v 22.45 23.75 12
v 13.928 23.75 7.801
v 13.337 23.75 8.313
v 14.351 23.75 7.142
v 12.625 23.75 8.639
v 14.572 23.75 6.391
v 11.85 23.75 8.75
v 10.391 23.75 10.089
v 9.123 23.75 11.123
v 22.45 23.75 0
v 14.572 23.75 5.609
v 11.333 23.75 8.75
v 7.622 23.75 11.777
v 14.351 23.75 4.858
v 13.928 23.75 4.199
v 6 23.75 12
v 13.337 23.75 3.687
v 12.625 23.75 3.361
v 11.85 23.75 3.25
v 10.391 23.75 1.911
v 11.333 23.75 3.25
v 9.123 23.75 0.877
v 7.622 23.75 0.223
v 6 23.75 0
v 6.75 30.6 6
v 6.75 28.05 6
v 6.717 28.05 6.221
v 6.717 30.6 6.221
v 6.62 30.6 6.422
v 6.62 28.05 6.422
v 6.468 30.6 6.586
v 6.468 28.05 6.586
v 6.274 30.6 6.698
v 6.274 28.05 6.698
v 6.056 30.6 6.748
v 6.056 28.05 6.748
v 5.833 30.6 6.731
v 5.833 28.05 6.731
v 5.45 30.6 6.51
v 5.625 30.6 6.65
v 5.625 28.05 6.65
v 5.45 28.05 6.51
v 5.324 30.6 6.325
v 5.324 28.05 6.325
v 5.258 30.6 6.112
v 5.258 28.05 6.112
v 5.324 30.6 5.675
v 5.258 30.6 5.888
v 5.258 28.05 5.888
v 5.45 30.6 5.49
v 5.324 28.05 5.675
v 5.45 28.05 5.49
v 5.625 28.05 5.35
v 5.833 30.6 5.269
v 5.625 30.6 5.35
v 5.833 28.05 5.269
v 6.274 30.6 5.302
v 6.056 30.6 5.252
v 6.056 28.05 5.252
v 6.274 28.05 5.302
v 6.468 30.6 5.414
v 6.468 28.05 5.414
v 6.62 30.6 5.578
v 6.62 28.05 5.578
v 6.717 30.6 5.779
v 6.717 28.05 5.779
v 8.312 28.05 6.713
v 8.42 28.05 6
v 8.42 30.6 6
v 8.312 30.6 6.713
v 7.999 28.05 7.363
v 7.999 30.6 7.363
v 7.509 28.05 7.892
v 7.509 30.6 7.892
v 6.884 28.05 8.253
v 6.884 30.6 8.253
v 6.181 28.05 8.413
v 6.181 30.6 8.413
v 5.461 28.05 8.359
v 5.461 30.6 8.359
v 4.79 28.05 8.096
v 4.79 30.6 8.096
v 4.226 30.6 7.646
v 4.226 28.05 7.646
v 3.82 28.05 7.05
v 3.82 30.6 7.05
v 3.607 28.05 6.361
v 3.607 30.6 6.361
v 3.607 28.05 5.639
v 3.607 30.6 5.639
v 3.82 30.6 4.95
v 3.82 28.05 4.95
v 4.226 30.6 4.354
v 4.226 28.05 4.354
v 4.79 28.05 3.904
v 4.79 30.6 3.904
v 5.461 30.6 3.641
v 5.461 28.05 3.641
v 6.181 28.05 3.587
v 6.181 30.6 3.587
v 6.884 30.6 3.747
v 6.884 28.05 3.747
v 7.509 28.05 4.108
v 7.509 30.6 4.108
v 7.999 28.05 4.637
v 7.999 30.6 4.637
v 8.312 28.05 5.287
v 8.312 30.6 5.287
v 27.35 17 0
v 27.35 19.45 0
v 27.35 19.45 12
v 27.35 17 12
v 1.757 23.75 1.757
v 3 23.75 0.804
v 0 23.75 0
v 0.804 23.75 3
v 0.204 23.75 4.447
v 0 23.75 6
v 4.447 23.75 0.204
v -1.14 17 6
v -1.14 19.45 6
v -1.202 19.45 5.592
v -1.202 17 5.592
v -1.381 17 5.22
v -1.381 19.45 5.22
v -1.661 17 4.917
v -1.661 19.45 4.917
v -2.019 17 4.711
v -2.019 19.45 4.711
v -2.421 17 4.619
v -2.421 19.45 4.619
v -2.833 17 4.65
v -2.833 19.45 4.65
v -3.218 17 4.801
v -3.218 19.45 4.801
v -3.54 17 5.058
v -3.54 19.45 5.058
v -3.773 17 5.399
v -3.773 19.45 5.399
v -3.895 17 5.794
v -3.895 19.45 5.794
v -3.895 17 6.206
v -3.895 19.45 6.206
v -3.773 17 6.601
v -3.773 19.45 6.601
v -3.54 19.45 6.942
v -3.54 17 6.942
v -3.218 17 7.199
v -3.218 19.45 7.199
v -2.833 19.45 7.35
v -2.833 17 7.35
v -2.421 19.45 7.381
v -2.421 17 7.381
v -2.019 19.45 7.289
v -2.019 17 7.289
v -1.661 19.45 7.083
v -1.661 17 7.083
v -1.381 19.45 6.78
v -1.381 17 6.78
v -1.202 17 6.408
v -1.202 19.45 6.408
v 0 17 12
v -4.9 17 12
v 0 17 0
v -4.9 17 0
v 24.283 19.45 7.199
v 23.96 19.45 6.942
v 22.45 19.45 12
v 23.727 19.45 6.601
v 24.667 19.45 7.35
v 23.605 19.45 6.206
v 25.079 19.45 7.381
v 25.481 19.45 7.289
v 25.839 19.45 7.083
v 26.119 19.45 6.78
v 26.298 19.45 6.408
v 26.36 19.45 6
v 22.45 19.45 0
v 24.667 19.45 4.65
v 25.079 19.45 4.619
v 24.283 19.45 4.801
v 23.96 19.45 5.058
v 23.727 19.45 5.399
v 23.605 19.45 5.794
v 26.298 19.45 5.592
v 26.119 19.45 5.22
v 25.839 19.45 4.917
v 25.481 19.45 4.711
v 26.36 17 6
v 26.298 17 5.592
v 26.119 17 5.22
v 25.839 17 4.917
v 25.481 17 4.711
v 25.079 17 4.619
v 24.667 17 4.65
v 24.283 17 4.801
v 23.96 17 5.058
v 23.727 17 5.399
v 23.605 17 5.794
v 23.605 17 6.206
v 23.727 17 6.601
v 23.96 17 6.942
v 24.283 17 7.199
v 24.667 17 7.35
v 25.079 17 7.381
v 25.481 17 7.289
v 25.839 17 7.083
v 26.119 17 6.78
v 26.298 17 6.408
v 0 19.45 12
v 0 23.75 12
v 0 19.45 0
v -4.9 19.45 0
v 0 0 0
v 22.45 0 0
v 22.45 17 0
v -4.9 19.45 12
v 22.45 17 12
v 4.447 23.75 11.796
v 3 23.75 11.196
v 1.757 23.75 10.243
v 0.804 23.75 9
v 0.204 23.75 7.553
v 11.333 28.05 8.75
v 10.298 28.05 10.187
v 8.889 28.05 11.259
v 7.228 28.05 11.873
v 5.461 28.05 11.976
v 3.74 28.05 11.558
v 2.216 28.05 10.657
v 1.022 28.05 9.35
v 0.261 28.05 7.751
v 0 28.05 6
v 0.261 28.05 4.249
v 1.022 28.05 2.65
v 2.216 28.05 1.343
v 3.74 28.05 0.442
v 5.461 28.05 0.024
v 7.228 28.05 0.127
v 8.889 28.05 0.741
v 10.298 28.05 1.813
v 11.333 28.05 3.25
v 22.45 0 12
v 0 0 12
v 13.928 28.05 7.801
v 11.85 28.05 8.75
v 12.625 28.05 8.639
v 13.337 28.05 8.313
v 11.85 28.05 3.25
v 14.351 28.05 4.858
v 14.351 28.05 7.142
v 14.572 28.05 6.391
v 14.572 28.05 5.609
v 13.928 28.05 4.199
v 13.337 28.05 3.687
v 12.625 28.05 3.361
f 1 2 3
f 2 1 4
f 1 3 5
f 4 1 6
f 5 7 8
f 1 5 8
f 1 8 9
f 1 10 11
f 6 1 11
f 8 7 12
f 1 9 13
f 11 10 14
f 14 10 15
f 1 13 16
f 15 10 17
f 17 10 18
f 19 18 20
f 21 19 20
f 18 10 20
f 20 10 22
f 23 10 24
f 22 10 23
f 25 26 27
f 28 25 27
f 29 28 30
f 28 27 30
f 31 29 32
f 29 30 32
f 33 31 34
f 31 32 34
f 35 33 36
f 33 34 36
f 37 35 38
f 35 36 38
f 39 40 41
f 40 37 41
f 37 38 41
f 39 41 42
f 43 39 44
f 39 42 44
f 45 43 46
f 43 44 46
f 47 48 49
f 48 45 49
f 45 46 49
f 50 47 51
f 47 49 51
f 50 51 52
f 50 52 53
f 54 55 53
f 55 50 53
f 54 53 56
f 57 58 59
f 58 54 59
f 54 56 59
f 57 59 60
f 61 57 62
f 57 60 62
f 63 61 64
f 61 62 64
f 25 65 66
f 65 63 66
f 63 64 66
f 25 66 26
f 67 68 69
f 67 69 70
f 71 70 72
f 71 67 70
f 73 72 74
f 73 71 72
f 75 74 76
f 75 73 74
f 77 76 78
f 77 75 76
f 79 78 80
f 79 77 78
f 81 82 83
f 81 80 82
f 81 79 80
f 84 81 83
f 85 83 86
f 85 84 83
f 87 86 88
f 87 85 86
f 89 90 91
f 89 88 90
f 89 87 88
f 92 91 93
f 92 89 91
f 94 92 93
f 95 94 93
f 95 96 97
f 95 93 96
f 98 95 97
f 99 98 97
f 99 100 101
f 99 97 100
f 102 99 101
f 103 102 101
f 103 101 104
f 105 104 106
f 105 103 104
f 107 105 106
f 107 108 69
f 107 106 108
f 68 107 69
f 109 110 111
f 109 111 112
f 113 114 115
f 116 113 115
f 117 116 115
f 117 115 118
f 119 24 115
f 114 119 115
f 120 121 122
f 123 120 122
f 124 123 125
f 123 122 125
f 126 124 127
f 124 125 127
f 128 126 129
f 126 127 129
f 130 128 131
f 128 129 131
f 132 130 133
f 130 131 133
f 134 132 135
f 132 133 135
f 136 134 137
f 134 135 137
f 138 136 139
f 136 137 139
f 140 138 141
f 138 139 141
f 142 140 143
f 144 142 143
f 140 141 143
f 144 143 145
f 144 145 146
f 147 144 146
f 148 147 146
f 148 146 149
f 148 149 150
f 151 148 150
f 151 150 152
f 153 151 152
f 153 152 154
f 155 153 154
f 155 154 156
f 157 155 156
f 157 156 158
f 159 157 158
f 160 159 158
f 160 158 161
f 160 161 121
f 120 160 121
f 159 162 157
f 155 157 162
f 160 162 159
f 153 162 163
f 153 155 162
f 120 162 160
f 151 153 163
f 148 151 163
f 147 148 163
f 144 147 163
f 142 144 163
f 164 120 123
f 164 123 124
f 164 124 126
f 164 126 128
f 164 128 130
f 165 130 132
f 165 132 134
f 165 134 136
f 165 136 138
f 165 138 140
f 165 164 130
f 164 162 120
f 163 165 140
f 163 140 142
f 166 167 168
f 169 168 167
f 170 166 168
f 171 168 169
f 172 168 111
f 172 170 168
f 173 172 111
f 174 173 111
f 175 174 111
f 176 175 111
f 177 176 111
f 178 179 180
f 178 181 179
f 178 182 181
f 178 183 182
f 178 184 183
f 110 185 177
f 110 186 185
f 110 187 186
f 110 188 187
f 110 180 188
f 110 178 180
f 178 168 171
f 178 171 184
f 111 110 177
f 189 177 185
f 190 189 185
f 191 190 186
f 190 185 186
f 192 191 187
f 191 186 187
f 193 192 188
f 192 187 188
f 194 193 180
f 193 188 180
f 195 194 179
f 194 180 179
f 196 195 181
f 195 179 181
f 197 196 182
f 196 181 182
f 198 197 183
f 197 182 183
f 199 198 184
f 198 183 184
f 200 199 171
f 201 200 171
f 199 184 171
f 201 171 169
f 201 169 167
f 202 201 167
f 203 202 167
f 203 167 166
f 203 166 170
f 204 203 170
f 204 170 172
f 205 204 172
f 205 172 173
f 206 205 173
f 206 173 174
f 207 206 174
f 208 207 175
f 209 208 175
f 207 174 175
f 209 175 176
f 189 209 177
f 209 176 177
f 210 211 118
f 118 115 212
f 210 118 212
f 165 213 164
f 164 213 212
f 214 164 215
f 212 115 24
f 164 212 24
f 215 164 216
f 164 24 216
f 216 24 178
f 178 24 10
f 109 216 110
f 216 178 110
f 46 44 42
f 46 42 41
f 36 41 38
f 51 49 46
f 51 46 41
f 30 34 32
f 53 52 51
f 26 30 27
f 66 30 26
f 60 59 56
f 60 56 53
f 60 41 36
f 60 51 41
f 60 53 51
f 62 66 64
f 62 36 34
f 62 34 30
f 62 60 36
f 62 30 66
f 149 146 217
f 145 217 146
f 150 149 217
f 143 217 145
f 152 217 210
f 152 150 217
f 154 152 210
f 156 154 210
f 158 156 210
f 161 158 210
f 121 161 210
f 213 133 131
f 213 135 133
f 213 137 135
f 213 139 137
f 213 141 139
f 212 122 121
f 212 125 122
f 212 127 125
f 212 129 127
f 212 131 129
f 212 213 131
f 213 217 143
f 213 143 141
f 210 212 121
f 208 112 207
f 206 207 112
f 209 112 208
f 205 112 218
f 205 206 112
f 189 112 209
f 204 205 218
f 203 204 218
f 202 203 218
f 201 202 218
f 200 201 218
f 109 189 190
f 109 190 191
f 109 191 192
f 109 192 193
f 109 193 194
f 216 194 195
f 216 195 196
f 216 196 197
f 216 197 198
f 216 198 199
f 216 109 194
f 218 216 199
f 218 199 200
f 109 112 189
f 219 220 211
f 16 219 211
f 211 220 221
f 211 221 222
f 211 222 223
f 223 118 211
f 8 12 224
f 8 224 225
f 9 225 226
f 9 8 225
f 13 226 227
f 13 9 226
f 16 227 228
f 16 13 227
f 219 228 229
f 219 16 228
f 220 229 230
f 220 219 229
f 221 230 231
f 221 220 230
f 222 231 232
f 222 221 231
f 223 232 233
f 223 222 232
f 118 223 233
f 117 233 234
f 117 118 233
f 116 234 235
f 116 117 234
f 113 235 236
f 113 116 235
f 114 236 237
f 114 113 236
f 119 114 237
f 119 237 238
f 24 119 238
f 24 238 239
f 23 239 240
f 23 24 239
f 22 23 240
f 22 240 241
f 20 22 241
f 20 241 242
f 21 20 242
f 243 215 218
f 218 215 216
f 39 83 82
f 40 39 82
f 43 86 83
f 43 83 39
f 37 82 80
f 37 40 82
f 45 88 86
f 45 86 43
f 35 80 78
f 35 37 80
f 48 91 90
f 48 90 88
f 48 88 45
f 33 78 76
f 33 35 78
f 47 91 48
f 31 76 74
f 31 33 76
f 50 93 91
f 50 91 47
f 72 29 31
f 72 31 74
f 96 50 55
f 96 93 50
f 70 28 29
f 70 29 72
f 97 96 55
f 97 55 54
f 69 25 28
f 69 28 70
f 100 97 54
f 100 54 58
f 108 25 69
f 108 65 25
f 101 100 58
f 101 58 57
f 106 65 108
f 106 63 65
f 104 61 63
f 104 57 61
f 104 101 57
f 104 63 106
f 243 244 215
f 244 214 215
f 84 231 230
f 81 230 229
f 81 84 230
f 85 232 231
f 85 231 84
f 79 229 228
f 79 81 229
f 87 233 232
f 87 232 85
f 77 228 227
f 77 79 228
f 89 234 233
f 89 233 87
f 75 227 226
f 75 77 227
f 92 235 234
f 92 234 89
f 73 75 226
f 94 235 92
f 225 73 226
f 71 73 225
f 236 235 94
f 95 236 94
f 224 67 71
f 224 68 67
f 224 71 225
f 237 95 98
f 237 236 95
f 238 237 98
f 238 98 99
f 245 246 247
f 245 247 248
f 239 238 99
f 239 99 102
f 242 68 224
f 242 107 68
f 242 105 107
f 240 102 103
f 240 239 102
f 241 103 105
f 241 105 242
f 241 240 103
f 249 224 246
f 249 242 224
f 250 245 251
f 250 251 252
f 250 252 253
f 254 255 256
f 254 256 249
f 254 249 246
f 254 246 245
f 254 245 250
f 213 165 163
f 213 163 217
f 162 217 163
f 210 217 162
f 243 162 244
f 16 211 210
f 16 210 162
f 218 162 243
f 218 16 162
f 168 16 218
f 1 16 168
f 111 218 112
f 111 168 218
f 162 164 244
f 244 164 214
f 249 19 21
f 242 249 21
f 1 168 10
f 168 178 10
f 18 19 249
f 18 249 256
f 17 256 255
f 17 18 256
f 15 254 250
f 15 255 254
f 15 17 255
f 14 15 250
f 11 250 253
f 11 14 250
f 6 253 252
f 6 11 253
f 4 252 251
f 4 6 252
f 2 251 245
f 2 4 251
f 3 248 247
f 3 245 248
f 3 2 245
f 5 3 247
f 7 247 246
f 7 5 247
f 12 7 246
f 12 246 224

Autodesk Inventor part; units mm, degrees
ref_plane "YZ Plane" through (0, 0, 0) normal (1, 0, 0) x (0, 1, 0)
ref_plane "XZ Plane" through (0, 0, 0) normal (0, 1, 0) x (-1, 0, 0)
ref_plane "XY Plane" through (0, 0, 0) normal (0, 0, 1) x (1, 0, 0)
sketch "Sketch1" plane through (0, 0, 0) normal (0, 0, 1) x (1, 0, 0)
  line L0 (0, 0) -> (22.45, 0)
  line L1 (22.45, 0) -> (22.45, 23.75)
  line L2 (22.45, 23.75) -> (0, 23.75)
  line L3 (0, 23.75) -> (0, 0)
  line L4 (-4.9, 19.45) -> (27.35, 19.45)
  line L5 (27.35, 19.45) -> (27.35, 17)
  line L6 (27.35, 17) -> (-4.9, 17)
  line L7 (-4.9, 17) -> (-4.9, 19.45)
  point P0 (0, 19.45)
  point P1 (0, 17)
  point P2 (22.45, 17)
  point P3 (22.45, 19.45)
  dimension "d0" = 23.75
  dimension "d1" = 22.45
  dimension "d2" = 2.45
  dimension "d3" = 17
  dimension "d4" = 4.9
  dimension "d5" = 4.9
extrude "Extrusion1" add sketch "Sketch1" along normal blind 12
sketch "Sketch2" plane through (22.45, 19.45, 0) normal (0, 1, 0) x (1, 0, 0)
  line L0 (-27.35, 0) -> (-27.35, -12) projected
  line L1 (-27.35, -6) -> (4.9, -6) construction
  line L2 (4.9, 0) -> (4.9, -12) projected
  circle A0 centre (-24.975, -6) radius 1.385
  circle A1 centre (2.525, -6) radius 1.385
  circle A2 centre (-24.975, -6) radius 2.375 construction
  circle A3 centre (2.525, -6) radius 2.375 construction
  line L3 (4.9, 0) -> (4.9, -12) projected
  point P0 (-22.45, 0)
  dimension "d8" = 2.77
  dimension "d9" = 27.5
extrude "Extrusion2" cut sketch "Sketch2" against normal blind 10
sketch "Sketch3" plane through (0, 23.75, 0) normal (0, 1, 0) x (1, 0, 0)
  arc A0 (11.3327, -3.25) -> (11.3327, -8.75) centre (6, -6) ccw
  line L0 (22.45, 0) -> (0, 0) projected
  line L1 (0, 0) -> (0, -12) projected
  line L2 (22.45, -12) -> (0, -12) projected
  arc A1 (11.85, -8.75) -> (11.85, -3.25) centre (11.85, -6) ccw
  line L3 (14.6, -9.3785) -> (14.6, -0.6215) construction
  line L4 (11.85, -6) -> (0, -6) construction
  line L5 (0, 0) -> (0, -12) projected
  line L6 (11.85, -8.75) -> (11.3327, -8.75)
  line L7 (11.85, -3.25) -> (11.3327, -3.25)
  dimension "d12" = 5.5
  dimension "d13" = 14.6
extrude "Extrusion3" add sketch "Sketch3" along normal blind 4.3 contours L7 A1 L6 A0
sketch "Sketch4" plane through (0, 28.05, 0) normal (0, 1, 0) x (1, 0, 0)
  arc A0 (6, 0) -> (0, -6) centre (6, -6) ccw projected
  circle A1 centre (6, -6) radius 2.42
  circle A2 centre (6, -6) radius 0.75
  point P0 (0, 0)
  dimension "d16" = 4.84
  dimension "d17" = 1.5
extrude "Extrusion4" add sketch "Sketch4" along normal blind 2.55
properties part number "9g-servo"
